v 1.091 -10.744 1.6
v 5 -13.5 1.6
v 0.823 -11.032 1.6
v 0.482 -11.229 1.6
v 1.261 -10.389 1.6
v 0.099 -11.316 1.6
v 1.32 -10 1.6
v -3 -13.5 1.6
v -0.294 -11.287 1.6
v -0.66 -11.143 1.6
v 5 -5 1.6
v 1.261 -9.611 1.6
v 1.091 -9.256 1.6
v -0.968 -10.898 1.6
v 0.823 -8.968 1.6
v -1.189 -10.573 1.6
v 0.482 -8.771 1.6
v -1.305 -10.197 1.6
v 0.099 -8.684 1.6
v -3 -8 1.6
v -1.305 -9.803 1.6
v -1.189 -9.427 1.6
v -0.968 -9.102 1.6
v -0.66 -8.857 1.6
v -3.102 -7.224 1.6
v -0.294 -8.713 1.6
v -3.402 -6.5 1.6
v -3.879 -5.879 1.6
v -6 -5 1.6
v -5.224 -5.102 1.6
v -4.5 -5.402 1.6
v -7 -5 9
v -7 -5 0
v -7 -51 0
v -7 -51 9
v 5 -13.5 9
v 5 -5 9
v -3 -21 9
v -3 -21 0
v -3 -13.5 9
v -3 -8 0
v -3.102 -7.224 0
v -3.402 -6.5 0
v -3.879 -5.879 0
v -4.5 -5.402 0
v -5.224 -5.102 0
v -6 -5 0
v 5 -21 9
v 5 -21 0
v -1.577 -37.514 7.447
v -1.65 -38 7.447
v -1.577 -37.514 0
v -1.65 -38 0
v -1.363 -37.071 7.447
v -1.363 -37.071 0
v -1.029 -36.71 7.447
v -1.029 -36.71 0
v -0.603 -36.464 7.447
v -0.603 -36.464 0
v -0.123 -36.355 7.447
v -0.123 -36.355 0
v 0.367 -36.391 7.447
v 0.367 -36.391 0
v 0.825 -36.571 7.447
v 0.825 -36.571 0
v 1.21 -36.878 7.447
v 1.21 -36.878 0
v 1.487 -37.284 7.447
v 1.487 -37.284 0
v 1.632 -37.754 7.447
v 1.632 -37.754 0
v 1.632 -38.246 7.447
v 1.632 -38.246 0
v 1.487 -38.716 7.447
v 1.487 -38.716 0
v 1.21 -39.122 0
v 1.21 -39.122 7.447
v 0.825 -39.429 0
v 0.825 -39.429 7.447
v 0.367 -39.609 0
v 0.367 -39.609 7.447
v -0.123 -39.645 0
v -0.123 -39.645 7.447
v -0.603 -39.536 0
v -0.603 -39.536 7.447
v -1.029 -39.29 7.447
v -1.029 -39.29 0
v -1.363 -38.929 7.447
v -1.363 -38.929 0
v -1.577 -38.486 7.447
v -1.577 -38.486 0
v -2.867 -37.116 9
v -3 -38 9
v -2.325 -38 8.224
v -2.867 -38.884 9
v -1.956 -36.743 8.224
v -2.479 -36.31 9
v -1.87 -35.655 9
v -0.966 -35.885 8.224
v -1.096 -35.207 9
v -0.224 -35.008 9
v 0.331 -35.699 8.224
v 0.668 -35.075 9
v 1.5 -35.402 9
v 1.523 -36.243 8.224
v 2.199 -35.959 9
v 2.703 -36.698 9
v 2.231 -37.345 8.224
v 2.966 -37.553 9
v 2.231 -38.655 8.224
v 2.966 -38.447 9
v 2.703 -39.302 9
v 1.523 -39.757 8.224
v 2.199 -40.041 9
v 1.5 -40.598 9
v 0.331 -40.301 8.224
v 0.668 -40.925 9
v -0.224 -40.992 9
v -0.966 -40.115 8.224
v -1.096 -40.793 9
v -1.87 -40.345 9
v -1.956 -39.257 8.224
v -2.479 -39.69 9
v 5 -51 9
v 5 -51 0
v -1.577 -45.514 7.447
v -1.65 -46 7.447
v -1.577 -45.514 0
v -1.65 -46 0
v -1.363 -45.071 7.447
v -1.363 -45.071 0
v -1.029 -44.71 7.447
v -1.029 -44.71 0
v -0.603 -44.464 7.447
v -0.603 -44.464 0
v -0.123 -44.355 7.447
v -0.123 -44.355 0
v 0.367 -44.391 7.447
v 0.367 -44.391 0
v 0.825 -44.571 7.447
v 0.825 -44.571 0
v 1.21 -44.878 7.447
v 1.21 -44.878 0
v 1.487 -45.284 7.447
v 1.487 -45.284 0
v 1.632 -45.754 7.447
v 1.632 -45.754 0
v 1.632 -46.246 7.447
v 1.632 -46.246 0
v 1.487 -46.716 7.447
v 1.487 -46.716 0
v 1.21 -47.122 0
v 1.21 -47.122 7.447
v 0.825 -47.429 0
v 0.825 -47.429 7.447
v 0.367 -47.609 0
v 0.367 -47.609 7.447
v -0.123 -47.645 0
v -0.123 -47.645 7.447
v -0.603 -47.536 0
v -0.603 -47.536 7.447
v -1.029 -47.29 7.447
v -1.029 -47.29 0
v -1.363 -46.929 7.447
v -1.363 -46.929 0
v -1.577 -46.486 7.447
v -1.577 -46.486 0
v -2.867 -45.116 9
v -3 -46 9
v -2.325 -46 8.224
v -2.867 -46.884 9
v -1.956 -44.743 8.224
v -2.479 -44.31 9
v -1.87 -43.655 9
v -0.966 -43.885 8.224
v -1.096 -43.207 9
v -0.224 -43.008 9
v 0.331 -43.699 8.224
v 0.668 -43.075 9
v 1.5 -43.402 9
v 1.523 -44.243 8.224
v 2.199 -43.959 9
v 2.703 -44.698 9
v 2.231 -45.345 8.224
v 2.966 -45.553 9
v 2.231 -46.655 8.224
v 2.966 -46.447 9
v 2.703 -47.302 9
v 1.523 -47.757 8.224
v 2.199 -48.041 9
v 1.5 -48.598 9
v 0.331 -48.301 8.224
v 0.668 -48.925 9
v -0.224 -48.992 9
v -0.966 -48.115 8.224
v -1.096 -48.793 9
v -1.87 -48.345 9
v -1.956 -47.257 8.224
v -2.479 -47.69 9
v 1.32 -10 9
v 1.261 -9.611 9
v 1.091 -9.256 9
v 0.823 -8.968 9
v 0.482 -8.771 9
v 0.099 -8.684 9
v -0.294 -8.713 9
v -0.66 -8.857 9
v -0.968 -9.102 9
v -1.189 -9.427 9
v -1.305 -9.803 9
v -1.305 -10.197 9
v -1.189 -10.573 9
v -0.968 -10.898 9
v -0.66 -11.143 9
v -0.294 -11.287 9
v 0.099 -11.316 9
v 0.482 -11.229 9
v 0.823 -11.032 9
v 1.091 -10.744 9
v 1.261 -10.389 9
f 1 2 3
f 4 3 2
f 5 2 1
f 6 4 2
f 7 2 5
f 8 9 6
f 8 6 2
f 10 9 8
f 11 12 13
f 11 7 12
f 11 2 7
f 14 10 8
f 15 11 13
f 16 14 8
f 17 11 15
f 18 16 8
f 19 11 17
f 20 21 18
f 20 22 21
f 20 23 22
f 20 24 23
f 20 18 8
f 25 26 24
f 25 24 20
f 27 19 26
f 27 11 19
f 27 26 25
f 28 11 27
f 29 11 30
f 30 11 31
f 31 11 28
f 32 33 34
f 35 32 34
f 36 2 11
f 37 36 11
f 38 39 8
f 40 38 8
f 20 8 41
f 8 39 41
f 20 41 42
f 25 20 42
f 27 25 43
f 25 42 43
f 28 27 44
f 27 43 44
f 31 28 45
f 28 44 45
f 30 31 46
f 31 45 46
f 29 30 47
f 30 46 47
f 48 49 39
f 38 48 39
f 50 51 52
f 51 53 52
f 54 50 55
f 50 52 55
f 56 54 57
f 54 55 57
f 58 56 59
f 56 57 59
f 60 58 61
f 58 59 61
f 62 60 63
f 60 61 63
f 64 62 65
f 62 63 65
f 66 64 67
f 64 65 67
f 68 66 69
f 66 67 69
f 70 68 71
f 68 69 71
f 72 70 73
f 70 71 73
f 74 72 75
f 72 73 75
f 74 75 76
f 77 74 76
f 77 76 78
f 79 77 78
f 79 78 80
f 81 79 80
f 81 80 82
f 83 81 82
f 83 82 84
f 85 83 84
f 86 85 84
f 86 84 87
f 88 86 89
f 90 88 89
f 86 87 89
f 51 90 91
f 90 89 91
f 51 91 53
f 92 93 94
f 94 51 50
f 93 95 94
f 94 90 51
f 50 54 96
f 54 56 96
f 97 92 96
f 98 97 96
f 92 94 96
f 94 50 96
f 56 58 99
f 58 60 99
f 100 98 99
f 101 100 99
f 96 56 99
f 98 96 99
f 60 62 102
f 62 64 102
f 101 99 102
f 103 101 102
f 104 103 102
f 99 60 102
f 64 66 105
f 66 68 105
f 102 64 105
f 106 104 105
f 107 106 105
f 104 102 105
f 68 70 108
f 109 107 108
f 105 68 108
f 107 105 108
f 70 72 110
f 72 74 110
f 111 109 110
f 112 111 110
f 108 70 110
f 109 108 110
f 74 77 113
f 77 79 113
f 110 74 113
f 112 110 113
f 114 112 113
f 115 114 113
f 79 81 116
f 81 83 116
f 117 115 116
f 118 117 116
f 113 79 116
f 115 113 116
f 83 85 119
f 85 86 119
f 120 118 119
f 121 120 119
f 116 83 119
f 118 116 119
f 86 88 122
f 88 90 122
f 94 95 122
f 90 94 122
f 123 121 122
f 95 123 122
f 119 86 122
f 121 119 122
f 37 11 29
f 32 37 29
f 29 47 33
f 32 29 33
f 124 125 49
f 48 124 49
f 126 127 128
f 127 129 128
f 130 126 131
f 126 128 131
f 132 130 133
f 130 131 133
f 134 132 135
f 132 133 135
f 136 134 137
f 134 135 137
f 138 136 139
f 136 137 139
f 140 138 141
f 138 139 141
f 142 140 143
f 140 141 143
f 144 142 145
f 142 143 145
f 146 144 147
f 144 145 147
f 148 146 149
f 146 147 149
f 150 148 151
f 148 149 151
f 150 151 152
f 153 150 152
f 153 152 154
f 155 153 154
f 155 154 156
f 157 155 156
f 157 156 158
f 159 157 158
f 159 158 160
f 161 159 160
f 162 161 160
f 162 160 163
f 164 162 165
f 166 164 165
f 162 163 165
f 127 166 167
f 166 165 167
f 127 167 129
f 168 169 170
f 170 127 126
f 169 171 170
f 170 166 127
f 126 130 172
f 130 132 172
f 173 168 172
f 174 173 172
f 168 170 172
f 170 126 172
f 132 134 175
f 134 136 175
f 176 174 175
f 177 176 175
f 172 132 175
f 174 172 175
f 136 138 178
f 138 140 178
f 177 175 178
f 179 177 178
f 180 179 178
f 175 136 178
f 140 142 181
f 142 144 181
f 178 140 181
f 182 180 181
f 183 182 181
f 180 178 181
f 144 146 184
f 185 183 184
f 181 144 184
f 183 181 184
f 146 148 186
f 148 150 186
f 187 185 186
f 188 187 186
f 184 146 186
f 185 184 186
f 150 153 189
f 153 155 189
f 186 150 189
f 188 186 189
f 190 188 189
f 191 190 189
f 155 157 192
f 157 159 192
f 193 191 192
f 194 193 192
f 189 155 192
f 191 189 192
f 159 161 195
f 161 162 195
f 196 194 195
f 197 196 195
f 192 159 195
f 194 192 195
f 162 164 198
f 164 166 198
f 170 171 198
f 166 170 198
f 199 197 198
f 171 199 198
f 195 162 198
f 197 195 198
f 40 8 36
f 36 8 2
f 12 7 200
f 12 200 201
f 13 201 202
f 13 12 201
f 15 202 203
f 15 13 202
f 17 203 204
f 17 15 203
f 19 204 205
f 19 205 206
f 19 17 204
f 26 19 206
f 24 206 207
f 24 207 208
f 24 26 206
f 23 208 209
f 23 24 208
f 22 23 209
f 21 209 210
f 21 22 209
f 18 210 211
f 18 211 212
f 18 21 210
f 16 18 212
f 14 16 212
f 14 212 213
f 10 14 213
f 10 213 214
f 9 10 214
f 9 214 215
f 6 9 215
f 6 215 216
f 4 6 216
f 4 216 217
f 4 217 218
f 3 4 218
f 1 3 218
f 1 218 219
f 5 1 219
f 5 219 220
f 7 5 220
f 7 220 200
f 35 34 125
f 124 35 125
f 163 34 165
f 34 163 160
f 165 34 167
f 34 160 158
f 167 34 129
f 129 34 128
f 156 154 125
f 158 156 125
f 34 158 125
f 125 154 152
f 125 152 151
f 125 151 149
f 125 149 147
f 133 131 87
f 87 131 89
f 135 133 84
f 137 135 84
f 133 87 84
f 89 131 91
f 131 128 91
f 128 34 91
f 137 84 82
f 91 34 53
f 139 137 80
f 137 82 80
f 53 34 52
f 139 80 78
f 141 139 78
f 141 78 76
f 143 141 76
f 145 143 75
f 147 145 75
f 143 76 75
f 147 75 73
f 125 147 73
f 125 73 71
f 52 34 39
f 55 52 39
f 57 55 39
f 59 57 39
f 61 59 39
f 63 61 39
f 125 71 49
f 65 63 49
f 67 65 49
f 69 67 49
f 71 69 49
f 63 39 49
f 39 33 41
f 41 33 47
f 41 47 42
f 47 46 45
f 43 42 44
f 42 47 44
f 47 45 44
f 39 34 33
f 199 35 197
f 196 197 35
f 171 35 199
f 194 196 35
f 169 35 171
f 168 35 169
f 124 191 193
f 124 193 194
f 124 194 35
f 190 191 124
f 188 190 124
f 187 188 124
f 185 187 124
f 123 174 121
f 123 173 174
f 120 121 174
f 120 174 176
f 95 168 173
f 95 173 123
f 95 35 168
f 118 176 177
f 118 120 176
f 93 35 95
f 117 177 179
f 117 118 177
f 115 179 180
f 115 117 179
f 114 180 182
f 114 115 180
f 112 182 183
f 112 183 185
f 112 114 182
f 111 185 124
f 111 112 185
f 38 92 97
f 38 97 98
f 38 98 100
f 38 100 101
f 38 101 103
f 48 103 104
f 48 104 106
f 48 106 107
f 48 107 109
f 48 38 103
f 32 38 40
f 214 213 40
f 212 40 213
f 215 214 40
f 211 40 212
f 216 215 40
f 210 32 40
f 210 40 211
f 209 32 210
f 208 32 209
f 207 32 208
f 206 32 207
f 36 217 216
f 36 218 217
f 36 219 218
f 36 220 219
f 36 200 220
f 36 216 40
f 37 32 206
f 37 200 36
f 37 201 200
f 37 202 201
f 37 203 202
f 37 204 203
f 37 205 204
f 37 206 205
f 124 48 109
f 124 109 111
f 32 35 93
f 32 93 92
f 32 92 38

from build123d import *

# Parameters (mm, degrees)
SKETCH072_R         = 1.32
PAD047_DEPTH        = 9
POCKET023_DEPTH     = 1.6
HOLE001_D           = 3.3
HOLE001_CSINK_D     = 6
HOLE001_CSINK_ANGLE = 82


with BuildPart() as part:
    # Sketch072 → Pad047 (new body)
    with BuildSketch(Plane.XY):
        Polygon((-7, -51), (5, -51), (5, -21), (-3, -21), (-3, -13.5), (5, -13.5), (5, -5), (-7, -5), align=None)
        with Locations((0, -10)):
            Circle(SKETCH072_R, mode=Mode.SUBTRACT)
    extrude(amount=PAD047_DEPTH)

    # Sketch073 → Pocket023 (cut)
    with BuildSketch(Plane.XY):
        with BuildLine():
            Line((-6, 4), (6, 4))
            Line((6, 4), (6, -21))
            Line((6, -21), (-3, -21))
            Line((-3, -21), (-3, -8))
            ThreePointArc((-3, -8), (-3.87868, -5.87868), (-6, -5))
            Line((-6, -5), (-6, 4))
        make_face()
    extrude(amount=POCKET023_DEPTH, mode=Mode.SUBTRACT)

    # Hole001 (through all)
    with Locations(Plane.XY.offset(9)):
        with Locations((0, -38), (0, -46)):
            CounterSinkHole(HOLE001_D / 2, HOLE001_CSINK_D / 2, counter_sink_angle=HOLE001_CSINK_ANGLE)


solid = part.part
